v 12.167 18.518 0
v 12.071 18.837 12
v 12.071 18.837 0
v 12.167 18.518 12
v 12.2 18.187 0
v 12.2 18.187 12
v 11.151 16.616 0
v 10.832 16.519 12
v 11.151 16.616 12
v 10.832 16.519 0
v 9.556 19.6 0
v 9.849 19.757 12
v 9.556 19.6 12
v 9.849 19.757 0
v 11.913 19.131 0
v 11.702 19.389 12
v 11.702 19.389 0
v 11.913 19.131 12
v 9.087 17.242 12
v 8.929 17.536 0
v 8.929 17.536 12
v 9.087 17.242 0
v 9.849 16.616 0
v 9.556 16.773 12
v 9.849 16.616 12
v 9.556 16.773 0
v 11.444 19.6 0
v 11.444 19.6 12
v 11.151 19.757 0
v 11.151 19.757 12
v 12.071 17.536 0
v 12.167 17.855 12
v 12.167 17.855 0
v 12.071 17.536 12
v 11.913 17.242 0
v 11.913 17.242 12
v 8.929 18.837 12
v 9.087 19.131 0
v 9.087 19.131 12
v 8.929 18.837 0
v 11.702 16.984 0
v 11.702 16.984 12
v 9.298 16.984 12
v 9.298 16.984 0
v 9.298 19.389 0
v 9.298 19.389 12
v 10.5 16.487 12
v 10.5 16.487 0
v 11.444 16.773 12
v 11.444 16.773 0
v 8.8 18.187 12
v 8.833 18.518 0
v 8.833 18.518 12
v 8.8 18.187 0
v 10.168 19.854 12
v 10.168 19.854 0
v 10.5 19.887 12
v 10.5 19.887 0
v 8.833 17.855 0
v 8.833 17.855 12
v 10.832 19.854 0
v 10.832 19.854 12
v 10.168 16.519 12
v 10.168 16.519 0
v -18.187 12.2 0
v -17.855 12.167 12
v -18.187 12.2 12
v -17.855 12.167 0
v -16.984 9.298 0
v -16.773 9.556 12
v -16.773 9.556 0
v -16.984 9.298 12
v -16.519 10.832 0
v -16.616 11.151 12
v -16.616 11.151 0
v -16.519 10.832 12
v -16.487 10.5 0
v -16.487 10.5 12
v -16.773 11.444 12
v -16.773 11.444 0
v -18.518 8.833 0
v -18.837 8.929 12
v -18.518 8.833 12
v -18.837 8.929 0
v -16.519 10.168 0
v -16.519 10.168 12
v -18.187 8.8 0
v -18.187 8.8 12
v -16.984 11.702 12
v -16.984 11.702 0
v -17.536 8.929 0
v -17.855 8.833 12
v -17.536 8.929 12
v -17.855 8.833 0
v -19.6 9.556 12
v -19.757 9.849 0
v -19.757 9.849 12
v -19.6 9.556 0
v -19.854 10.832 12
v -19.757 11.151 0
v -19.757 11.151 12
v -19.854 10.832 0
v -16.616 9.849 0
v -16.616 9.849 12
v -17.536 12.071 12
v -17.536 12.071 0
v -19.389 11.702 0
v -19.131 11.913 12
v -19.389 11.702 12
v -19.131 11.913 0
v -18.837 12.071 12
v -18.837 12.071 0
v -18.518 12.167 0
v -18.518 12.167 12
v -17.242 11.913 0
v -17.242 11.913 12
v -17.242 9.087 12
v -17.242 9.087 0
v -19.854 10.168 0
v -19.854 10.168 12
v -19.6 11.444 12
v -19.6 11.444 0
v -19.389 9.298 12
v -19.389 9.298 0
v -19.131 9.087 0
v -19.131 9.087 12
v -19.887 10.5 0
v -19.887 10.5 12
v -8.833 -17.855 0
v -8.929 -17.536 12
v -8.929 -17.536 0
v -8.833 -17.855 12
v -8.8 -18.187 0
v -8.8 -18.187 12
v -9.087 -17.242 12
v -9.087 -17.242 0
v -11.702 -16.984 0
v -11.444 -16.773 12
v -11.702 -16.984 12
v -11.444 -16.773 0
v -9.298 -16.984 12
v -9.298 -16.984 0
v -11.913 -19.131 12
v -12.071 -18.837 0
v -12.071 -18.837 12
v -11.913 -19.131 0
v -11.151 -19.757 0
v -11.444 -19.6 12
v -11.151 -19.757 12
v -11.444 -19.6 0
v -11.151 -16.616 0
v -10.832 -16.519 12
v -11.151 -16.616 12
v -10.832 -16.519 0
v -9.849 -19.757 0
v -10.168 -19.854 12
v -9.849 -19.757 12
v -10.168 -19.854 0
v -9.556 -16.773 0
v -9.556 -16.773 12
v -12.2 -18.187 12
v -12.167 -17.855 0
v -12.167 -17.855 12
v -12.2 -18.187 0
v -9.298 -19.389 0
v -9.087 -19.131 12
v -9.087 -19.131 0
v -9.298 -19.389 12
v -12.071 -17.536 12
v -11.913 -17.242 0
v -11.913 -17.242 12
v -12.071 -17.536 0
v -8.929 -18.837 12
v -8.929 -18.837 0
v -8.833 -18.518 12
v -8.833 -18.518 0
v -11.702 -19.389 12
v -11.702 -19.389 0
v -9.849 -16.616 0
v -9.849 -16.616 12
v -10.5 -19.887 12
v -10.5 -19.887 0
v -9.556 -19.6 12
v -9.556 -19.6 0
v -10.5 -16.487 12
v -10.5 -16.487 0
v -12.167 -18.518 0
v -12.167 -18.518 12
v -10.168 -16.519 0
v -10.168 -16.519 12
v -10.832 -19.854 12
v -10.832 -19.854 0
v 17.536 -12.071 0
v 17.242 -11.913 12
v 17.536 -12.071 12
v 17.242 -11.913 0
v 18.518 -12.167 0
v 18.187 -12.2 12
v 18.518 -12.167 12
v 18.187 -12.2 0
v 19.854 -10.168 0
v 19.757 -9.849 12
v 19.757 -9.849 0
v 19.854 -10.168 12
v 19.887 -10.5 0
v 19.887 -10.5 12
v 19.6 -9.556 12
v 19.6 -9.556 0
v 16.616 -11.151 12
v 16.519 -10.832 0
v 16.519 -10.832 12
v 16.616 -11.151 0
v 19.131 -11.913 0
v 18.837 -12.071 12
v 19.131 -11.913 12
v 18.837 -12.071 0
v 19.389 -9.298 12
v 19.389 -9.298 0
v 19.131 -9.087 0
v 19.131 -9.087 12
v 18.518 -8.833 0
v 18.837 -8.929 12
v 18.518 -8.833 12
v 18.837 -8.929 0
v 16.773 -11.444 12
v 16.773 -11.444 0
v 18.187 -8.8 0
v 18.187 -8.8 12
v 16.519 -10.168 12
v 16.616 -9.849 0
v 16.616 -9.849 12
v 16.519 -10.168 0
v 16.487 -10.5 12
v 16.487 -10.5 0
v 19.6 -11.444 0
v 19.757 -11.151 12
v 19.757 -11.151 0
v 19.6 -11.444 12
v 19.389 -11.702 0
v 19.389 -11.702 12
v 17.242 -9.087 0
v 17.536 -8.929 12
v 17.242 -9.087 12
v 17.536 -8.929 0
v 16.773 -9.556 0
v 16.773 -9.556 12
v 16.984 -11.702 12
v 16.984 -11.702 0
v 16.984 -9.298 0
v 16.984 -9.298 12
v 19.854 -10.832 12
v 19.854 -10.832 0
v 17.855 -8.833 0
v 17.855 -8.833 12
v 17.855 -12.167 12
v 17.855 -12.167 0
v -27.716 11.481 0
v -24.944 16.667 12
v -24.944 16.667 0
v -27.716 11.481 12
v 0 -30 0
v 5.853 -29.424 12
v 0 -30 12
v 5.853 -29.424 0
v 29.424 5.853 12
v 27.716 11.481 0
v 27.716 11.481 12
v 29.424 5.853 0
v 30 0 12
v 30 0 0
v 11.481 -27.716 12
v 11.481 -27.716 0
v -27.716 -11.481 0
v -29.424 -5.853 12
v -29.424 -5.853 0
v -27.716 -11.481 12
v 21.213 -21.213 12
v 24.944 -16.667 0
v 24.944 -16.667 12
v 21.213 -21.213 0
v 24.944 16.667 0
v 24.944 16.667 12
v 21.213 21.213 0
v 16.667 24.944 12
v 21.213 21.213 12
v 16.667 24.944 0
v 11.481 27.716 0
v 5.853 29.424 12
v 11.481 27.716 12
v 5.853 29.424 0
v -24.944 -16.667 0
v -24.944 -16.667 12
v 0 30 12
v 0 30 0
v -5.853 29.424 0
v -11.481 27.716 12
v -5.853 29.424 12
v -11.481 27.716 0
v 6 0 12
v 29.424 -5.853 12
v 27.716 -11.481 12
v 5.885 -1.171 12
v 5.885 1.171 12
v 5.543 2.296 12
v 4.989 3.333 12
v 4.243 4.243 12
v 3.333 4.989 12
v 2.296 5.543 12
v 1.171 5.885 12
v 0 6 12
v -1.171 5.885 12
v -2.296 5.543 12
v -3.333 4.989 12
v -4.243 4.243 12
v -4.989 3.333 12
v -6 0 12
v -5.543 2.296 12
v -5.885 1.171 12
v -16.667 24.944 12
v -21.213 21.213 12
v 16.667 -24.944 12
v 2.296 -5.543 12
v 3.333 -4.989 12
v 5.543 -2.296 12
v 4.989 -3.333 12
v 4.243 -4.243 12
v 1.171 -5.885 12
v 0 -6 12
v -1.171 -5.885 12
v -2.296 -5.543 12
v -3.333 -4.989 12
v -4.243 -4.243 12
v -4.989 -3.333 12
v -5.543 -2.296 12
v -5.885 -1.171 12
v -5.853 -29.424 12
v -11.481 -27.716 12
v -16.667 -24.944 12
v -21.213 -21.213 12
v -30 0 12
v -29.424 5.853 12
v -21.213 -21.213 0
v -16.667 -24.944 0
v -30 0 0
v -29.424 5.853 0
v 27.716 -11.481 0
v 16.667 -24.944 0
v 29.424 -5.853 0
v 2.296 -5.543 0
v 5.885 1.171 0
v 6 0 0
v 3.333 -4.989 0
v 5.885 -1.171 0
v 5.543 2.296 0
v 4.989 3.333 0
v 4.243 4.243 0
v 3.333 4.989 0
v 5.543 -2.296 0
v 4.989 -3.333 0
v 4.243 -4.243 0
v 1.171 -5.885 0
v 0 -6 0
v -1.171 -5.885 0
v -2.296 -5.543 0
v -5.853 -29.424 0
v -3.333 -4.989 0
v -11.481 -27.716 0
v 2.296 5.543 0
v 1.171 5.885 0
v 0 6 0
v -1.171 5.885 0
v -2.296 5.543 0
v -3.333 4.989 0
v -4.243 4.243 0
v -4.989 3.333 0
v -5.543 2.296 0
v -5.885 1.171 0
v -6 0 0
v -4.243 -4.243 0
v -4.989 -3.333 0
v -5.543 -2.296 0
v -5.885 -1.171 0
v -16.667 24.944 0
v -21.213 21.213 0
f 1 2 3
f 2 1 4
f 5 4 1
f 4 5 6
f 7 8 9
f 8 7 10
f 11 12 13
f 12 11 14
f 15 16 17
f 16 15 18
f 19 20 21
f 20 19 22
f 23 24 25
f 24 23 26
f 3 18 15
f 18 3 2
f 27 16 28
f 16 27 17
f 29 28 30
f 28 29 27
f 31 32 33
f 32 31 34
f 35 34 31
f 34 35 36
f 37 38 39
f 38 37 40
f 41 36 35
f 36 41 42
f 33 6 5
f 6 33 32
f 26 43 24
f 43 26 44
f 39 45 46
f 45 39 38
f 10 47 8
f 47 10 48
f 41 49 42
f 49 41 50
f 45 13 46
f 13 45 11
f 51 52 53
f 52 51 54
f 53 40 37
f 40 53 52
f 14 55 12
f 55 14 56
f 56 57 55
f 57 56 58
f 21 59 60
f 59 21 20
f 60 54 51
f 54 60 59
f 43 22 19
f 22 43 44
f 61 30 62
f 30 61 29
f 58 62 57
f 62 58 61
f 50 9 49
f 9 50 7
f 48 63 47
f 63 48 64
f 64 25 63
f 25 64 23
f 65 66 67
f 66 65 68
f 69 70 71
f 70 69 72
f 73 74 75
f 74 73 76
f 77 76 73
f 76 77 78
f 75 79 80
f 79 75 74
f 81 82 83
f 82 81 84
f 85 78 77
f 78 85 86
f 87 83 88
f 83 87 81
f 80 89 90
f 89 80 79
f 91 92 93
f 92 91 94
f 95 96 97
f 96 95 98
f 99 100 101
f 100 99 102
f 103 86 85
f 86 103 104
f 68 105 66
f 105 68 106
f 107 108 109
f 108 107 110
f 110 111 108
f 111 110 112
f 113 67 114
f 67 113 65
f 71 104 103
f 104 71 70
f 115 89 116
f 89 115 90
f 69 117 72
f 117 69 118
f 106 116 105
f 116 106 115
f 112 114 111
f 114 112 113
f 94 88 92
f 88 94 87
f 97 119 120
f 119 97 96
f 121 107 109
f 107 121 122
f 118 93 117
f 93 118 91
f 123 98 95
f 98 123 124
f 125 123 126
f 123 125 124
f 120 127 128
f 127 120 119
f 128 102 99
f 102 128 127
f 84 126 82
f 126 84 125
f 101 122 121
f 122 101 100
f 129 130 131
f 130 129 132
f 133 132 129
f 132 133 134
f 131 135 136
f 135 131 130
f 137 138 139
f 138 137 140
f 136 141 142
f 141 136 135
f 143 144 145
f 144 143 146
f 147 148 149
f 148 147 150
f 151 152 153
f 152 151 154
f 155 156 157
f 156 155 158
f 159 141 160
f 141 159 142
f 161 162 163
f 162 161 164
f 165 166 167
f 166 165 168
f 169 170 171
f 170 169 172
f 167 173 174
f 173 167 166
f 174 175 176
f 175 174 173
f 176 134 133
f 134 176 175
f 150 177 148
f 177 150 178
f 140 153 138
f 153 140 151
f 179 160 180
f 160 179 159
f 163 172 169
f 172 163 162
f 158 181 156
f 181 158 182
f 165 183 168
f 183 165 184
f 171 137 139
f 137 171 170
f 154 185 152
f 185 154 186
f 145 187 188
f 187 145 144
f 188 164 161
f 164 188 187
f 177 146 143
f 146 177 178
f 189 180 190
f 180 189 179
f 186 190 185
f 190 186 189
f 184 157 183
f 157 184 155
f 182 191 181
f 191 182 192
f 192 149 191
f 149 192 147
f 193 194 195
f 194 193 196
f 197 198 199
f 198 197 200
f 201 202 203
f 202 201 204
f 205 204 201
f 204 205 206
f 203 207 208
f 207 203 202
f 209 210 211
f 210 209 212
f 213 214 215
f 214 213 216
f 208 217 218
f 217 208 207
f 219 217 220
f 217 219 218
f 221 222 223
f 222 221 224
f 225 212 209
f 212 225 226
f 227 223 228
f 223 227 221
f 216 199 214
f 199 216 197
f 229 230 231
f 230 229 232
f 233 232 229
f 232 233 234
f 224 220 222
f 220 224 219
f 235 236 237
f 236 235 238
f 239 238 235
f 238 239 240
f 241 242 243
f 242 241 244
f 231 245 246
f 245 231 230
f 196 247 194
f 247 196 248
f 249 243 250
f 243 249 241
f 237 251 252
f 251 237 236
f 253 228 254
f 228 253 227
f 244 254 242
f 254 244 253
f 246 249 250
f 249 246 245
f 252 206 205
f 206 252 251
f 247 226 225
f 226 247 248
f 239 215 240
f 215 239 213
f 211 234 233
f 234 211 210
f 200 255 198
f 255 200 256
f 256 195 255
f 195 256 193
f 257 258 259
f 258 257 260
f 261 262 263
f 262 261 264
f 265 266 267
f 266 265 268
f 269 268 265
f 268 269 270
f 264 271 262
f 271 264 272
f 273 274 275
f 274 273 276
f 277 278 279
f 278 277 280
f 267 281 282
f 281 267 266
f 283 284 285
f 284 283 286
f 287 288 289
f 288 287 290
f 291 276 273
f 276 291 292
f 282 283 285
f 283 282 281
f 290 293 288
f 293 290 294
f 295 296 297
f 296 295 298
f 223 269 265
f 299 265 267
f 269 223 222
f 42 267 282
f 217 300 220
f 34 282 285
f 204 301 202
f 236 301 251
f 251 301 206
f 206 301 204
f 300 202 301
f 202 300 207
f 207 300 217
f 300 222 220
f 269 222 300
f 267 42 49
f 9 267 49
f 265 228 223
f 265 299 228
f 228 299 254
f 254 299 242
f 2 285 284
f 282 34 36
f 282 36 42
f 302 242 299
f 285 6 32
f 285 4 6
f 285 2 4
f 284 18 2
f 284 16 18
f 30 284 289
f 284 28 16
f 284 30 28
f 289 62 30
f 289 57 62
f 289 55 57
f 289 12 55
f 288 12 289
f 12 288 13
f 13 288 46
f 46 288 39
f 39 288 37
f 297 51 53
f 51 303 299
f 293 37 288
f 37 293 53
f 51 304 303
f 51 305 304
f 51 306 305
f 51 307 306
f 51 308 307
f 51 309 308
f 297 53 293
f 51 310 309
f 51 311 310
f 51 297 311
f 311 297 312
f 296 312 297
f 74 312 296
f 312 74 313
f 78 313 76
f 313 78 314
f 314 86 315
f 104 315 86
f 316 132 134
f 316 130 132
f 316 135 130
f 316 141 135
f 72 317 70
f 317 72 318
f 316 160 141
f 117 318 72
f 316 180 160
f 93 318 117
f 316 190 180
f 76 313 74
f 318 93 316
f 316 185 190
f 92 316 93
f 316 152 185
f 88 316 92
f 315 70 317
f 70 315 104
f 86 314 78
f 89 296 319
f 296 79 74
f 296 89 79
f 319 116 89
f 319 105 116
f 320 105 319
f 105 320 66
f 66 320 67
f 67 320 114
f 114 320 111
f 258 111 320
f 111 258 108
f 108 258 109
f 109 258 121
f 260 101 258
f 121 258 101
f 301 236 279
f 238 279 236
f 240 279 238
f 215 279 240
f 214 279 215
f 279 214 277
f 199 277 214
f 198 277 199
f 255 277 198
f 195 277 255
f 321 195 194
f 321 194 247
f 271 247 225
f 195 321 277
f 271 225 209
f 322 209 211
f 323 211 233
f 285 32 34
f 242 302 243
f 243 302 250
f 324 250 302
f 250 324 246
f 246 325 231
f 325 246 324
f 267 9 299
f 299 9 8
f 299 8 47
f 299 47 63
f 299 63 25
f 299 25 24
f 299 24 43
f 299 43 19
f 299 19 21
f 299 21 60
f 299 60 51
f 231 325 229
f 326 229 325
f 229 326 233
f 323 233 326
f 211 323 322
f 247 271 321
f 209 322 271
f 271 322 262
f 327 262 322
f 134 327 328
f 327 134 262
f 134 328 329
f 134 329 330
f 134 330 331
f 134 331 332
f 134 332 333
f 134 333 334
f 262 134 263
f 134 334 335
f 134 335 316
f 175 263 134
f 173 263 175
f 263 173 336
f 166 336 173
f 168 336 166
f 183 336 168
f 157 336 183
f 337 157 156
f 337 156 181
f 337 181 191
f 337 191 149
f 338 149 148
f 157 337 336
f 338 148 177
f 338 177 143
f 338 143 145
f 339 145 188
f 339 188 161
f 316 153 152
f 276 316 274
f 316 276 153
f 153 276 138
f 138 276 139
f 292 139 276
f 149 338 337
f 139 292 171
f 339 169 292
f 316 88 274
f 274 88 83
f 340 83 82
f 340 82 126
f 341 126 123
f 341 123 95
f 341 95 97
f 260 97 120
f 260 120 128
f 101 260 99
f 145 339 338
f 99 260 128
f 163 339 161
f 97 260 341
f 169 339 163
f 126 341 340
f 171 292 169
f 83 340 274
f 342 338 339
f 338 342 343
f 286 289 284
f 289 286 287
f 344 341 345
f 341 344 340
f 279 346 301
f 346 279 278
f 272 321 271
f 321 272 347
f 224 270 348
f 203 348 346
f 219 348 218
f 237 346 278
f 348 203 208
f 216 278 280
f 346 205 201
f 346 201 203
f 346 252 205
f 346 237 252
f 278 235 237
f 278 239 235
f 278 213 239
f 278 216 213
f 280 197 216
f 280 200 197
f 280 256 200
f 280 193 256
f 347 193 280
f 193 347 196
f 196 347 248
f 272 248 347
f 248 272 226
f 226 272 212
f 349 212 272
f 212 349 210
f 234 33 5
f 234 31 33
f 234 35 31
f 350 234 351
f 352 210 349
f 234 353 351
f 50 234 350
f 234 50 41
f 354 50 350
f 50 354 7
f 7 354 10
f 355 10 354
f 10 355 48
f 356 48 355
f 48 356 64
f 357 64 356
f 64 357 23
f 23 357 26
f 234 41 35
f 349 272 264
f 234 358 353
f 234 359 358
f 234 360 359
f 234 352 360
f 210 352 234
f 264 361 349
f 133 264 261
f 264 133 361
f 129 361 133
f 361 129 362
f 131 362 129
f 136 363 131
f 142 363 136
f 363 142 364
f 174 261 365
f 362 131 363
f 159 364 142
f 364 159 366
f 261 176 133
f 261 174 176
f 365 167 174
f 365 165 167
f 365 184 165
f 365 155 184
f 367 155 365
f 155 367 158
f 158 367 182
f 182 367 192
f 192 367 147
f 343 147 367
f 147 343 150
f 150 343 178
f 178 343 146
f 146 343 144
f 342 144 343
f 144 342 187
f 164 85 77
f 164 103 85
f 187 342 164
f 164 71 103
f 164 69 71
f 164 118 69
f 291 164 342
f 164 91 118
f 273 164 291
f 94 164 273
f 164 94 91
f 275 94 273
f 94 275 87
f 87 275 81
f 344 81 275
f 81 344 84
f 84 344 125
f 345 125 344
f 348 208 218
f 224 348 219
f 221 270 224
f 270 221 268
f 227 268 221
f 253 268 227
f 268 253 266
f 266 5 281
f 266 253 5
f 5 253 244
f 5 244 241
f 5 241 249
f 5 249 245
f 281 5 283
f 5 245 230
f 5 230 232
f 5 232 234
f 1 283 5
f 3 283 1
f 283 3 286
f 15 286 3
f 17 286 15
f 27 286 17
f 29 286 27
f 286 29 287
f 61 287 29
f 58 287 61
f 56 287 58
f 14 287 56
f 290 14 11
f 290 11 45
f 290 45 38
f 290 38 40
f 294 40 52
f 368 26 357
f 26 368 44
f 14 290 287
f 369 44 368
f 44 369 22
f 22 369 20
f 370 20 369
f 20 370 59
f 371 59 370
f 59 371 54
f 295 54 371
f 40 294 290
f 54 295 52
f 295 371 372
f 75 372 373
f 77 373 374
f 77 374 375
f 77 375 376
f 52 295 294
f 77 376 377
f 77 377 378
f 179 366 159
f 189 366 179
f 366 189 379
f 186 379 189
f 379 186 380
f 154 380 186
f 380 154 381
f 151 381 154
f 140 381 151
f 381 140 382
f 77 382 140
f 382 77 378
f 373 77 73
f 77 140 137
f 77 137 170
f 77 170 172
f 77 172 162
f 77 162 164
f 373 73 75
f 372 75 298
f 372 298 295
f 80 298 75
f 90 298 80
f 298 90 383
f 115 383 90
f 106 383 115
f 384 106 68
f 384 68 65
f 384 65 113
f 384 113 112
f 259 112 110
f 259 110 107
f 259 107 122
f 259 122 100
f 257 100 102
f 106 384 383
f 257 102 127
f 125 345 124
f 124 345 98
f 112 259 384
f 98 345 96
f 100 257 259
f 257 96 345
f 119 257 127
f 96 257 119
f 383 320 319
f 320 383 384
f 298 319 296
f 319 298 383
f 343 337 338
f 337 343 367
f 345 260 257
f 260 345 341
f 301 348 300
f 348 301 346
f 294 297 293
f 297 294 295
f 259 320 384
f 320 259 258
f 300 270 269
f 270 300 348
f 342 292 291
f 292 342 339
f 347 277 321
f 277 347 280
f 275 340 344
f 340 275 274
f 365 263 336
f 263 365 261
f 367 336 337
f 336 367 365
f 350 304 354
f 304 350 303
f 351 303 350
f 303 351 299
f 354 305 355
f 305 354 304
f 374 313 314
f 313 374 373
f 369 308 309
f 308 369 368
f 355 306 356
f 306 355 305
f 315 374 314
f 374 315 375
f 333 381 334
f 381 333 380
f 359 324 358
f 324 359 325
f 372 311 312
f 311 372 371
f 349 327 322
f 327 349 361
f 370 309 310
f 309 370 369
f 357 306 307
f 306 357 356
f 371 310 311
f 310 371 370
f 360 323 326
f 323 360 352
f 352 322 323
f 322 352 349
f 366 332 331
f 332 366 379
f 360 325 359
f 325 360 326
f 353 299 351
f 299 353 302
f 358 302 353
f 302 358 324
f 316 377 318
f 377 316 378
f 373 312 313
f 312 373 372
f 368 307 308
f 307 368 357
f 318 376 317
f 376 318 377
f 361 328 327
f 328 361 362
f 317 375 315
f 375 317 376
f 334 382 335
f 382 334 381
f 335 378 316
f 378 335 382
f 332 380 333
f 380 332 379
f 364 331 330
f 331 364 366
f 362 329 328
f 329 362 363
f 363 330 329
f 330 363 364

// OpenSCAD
$fn = 32;

// ----------------------------------------------------------------------
// Flange Ø60 x 12
// 4 holes on a Ø42 bolt circle, bolted joints
// ----------------------------------------------------------------------

// --- parameters (mm) ---
flange_d = 60;   // outside diameter of the flange
thickness = 12;  // flange thickness
holes = 4;       // number of bolt holes
pcd = 42;        // bolt circle diameter
start_deg = 60;  // angle of the first hole, from +X
hole_d = 3.4;    // bolt hole diameter
bore_d = 12;     // central through bore
hub_d = 22;      // hub outside diameter
hub_h = 0;       // hub height above the flange face (0 = no hub)

// --- derived feature positions (mm) ---
height = thickness + hub_h;  // = 12   overall height of the part
pcd_r = pcd / 2;             // = 21   bolt circle radius
hole_step = 360 / holes;     // = 90   angular pitch
feature_centers = [
  [pcd_r * cos(start_deg + 0 * hole_step), pcd_r * sin(start_deg + 0 * hole_step)],
  [pcd_r * cos(start_deg + 1 * hole_step), pcd_r * sin(start_deg + 1 * hole_step)],
  [pcd_r * cos(start_deg + 2 * hole_step), pcd_r * sin(start_deg + 2 * hole_step)],
  [pcd_r * cos(start_deg + 3 * hole_step), pcd_r * sin(start_deg + 3 * hole_step)]
];   // bolt hole centres on the pitch circle

// flange disc, every hole and the bore cut straight through
difference() {
  union() {
    cylinder(d = flange_d, h = thickness);
  }
  translate([0, 0, -1]) cylinder(d = bore_d, h = height + 2);  // bore, through
  for (centre = feature_centers)
    translate([centre[0], centre[1], -1]) cylinder(d = hole_d, h = thickness + 2);
}
